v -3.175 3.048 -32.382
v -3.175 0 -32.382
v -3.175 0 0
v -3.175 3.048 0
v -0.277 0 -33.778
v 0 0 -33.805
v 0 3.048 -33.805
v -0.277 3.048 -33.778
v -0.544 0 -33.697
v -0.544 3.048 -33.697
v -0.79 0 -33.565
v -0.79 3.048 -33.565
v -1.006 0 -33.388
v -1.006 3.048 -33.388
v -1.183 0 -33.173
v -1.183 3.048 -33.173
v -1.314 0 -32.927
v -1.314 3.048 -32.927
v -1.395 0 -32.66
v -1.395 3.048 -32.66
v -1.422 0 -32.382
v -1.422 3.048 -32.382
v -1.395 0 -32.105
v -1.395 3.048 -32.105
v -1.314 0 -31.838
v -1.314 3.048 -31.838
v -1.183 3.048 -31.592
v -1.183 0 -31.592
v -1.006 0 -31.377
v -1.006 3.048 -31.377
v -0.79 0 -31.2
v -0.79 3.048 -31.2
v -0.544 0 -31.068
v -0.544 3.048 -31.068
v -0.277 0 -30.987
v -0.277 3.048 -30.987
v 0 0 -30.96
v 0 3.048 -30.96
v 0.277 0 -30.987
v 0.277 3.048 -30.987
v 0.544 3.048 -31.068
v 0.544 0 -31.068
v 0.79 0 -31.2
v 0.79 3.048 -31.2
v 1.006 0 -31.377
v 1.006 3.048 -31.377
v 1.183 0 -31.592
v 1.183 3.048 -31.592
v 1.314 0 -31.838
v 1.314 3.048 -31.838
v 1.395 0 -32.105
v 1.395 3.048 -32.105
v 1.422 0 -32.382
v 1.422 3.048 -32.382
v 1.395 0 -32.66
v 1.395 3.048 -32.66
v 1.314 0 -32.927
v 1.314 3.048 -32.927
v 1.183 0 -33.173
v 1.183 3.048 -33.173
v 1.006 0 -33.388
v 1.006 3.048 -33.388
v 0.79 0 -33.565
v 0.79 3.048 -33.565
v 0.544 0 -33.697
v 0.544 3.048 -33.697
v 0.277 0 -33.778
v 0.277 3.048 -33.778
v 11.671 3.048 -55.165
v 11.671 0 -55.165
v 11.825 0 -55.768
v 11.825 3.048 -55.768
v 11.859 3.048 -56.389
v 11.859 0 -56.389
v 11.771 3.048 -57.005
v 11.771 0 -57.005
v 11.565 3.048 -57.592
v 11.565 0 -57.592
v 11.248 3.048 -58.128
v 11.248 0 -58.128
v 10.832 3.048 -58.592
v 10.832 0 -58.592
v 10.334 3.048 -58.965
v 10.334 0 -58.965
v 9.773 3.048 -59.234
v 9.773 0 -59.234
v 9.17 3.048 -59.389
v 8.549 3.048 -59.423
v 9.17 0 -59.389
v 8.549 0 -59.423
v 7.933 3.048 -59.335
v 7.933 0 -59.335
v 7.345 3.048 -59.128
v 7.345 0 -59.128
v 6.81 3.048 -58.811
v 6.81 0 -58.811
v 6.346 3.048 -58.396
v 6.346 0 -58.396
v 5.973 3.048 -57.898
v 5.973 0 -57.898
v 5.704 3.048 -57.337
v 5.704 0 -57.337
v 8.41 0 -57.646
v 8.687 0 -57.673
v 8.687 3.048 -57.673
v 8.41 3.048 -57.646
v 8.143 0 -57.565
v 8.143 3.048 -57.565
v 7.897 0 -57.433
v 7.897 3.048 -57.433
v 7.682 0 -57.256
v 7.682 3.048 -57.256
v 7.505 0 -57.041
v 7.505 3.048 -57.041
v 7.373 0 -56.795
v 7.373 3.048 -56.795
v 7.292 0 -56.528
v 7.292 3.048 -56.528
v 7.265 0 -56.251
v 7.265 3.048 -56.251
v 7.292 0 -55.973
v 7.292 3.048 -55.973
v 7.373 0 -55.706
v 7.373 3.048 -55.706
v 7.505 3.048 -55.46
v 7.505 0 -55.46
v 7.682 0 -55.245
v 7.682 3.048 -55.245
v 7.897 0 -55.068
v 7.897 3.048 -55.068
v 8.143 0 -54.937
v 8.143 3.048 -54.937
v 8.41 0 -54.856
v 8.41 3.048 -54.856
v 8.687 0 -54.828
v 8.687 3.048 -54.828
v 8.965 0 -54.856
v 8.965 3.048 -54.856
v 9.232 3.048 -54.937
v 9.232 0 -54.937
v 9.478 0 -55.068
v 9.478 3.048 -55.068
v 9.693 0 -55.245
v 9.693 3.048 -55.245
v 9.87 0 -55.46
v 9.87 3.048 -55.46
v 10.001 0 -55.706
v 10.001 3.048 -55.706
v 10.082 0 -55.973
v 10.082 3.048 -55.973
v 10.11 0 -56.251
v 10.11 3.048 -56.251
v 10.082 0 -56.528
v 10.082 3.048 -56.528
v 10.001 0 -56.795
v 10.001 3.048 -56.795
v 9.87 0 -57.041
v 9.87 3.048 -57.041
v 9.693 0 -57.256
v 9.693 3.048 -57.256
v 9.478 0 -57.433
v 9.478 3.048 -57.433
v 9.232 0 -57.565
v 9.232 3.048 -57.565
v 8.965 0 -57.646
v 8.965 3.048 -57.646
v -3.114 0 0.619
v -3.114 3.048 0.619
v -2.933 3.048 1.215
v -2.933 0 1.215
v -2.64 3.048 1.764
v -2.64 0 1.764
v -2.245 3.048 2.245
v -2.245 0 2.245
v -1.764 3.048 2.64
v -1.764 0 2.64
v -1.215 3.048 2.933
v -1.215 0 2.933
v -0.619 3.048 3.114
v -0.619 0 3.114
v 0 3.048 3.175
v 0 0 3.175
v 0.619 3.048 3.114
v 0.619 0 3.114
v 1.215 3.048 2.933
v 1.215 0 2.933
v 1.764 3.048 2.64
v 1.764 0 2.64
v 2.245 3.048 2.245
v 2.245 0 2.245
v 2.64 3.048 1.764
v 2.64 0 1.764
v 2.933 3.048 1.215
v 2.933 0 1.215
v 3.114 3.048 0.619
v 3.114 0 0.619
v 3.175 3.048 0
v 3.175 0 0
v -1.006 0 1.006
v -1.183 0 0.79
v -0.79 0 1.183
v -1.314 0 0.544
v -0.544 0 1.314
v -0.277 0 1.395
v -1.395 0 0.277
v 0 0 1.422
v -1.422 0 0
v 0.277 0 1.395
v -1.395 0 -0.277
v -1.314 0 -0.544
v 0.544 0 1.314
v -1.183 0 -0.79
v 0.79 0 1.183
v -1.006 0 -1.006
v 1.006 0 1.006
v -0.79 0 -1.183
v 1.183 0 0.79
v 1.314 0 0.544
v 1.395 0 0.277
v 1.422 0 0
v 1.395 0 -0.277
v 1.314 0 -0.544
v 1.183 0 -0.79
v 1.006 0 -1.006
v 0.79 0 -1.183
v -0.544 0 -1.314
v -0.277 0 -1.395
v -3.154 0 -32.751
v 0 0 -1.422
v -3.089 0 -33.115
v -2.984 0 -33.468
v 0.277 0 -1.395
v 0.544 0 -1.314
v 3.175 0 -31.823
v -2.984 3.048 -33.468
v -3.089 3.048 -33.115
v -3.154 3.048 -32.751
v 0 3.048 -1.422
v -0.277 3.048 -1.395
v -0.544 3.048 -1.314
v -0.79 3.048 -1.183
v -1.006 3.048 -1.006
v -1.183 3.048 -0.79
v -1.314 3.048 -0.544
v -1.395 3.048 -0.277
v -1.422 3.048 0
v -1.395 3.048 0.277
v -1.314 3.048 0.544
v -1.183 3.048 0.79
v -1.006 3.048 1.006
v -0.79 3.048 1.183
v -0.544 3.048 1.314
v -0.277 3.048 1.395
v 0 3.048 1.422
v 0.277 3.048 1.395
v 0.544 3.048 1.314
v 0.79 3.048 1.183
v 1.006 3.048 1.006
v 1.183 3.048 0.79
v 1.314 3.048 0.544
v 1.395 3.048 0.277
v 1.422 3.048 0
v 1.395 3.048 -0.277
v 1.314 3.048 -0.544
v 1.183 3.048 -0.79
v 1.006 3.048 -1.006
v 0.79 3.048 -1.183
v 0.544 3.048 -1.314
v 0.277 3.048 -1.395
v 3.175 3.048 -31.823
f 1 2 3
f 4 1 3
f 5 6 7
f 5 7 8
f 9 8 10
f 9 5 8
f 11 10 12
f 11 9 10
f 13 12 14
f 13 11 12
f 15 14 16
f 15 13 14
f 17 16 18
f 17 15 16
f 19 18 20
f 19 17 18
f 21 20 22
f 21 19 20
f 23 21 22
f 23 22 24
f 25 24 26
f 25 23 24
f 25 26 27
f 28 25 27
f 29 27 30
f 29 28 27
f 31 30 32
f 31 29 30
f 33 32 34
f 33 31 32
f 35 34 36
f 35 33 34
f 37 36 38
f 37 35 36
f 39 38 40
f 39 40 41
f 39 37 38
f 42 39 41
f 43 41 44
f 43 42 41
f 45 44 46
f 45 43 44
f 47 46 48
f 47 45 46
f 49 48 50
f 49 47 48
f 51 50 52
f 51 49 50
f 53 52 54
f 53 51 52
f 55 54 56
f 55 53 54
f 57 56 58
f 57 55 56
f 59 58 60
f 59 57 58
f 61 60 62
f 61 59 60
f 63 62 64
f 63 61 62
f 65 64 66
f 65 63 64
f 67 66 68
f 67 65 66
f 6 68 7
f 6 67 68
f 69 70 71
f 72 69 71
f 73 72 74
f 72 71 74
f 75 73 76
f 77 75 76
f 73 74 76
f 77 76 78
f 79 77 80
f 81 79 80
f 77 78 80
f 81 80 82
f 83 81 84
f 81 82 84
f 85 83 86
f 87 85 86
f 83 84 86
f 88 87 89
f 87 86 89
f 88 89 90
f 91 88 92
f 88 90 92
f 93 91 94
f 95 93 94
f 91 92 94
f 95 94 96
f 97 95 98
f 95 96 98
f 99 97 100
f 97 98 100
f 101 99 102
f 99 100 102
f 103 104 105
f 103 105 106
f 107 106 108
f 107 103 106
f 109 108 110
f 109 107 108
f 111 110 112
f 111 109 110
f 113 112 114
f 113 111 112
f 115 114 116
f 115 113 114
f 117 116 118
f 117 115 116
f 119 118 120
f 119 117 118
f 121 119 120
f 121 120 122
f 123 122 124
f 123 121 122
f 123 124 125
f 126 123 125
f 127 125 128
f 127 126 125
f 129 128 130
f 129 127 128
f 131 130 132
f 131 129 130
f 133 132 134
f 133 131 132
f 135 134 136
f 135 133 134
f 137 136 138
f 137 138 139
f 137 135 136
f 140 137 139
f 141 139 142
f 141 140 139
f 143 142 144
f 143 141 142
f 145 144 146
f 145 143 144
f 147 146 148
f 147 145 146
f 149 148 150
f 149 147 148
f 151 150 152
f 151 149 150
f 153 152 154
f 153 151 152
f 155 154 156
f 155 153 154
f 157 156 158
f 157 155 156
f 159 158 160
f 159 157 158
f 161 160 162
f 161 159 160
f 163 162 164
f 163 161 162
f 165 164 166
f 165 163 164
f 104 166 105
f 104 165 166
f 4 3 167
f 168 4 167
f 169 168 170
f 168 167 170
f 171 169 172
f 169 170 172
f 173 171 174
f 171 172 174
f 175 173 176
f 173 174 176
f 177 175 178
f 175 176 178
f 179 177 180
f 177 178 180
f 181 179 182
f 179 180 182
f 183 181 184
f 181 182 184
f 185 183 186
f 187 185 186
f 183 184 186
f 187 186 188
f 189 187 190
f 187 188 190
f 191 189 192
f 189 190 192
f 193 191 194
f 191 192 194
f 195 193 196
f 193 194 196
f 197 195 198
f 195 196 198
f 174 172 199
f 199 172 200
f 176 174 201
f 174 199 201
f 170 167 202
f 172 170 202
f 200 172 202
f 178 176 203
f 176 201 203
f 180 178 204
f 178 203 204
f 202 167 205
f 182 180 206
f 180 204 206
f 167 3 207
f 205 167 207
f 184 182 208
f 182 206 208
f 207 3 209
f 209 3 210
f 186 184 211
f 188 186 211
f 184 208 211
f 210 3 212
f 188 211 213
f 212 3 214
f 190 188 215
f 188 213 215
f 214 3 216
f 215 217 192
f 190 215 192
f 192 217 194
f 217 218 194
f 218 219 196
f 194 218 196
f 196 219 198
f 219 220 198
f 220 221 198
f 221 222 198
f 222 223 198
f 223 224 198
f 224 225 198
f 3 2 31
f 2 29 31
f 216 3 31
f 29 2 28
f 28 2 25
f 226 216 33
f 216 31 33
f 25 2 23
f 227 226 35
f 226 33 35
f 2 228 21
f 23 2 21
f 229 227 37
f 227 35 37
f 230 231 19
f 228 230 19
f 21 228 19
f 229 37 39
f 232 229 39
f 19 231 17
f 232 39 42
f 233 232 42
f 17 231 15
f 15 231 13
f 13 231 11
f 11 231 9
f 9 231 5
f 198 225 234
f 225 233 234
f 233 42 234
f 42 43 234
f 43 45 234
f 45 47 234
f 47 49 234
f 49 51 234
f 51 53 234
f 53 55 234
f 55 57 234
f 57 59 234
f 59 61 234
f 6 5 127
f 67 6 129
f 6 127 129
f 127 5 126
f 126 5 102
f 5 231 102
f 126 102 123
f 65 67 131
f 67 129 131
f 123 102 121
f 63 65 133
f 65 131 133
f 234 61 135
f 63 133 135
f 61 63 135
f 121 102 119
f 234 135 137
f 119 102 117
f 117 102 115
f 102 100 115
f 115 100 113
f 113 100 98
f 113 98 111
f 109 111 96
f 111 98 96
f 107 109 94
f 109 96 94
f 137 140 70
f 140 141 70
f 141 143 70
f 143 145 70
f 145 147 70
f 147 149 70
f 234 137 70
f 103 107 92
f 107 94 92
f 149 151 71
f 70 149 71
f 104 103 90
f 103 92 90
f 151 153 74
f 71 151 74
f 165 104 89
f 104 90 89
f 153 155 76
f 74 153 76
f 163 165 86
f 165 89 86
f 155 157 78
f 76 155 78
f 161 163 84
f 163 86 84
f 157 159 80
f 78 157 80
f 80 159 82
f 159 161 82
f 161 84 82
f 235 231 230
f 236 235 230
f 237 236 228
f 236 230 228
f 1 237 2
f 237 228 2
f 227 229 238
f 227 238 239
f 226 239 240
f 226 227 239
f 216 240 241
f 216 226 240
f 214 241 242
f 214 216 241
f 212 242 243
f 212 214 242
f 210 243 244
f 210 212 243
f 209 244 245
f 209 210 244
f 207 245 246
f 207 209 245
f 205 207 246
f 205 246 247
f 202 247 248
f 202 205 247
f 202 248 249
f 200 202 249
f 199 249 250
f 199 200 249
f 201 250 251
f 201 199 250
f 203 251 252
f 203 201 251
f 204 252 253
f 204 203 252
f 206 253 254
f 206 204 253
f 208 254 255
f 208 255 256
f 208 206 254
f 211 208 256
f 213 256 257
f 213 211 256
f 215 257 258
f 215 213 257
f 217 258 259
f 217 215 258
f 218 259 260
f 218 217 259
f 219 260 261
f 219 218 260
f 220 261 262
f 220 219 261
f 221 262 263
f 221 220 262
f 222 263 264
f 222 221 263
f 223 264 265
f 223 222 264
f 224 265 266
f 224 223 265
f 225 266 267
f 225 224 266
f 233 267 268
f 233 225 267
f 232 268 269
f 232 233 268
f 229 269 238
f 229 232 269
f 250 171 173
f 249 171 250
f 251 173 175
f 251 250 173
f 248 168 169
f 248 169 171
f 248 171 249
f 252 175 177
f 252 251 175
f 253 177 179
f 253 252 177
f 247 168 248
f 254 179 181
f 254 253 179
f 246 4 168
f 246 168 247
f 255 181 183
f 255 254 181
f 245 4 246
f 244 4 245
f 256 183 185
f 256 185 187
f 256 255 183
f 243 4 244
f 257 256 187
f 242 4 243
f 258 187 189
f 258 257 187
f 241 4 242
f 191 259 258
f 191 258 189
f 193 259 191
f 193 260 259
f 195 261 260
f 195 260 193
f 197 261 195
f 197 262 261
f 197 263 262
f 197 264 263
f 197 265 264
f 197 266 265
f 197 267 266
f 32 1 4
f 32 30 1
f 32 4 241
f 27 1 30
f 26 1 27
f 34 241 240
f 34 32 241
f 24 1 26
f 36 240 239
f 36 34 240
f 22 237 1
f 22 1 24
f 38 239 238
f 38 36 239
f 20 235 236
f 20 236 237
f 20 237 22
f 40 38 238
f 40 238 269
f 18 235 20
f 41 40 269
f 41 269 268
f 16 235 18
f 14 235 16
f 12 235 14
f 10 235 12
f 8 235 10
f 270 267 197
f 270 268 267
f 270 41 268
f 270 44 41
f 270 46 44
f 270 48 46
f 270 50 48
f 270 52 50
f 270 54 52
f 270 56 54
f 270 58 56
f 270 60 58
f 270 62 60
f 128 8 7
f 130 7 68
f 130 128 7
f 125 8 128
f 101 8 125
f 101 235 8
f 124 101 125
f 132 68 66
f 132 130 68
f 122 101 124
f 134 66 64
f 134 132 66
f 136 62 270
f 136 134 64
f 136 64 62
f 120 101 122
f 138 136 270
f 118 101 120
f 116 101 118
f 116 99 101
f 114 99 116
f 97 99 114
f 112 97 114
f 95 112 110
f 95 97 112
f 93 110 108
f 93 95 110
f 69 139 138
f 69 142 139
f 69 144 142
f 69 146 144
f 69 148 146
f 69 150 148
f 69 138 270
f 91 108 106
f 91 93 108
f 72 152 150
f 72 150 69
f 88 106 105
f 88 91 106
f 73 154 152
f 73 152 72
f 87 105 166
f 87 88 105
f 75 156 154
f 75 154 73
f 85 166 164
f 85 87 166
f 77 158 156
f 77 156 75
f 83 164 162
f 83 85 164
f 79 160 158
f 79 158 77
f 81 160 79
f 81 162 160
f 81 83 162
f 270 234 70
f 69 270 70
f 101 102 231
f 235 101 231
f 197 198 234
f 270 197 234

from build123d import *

# Parameters (mm, degrees)
SKETCH1_R           = 1.4224
BOSS_EXTRUDE1_DEPTH = 3.048


with BuildPart() as part:
    # Sketch1 → Boss-Extrude1 (new body)
    with BuildSketch(Plane(origin=(0, 0, 0), x_dir=(1, 0, 0), z_dir=(0, 1, 0))):
        with BuildLine():
            Line((-3.175, 32.38246), (-3.175, 0))
            ThreePointArc((-3.175, 0), (0, -3.175), (3.175, 0))
            Line((3.175, 0), (3.175, 31.822621836))
            Line((3.175, 31.822621836), (11.670835711, 55.164738613))
            ThreePointArc((11.670835711, 55.164738613), (9.773225596, 59.234176639), (5.703787569, 57.336566523))
            Line((5.703787569, 57.336566523), (-2.983524071, 33.468373955))
            ThreePointArc((-2.983524071, 33.468373955), (-3.126764616, 32.933792964), (-3.175, 32.38246))
        make_face()
        Circle(SKETCH1_R, mode=Mode.SUBTRACT)
        with Locations((0, 32.38246)):
            Circle(SKETCH1_R, mode=Mode.SUBTRACT)
        with Locations((8.68731164, 56.250652568)):
            Circle(SKETCH1_R, mode=Mode.SUBTRACT)
    extrude(amount=BOSS_EXTRUDE1_DEPTH)


solid = part.part
